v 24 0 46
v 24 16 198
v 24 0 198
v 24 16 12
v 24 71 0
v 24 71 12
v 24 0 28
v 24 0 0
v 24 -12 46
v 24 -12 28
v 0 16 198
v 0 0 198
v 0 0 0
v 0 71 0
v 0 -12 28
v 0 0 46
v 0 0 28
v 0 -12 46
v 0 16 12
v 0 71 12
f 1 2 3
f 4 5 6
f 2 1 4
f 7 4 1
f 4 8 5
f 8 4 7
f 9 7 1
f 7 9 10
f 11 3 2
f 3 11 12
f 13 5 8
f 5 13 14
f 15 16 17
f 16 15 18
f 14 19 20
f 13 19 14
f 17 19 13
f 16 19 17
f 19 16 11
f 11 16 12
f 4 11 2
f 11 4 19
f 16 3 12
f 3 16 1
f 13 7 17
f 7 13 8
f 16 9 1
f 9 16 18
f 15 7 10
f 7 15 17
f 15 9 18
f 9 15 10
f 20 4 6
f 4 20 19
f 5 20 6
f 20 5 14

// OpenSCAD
cube(
    [24, 16, 198],
    false
);

translate([0, -12, 28])
    cube(
        [24, 12, 18],
        false
    );

translate([0, 16, 0])
    cube(
        [24, 55, 12],
        false
    );
    
